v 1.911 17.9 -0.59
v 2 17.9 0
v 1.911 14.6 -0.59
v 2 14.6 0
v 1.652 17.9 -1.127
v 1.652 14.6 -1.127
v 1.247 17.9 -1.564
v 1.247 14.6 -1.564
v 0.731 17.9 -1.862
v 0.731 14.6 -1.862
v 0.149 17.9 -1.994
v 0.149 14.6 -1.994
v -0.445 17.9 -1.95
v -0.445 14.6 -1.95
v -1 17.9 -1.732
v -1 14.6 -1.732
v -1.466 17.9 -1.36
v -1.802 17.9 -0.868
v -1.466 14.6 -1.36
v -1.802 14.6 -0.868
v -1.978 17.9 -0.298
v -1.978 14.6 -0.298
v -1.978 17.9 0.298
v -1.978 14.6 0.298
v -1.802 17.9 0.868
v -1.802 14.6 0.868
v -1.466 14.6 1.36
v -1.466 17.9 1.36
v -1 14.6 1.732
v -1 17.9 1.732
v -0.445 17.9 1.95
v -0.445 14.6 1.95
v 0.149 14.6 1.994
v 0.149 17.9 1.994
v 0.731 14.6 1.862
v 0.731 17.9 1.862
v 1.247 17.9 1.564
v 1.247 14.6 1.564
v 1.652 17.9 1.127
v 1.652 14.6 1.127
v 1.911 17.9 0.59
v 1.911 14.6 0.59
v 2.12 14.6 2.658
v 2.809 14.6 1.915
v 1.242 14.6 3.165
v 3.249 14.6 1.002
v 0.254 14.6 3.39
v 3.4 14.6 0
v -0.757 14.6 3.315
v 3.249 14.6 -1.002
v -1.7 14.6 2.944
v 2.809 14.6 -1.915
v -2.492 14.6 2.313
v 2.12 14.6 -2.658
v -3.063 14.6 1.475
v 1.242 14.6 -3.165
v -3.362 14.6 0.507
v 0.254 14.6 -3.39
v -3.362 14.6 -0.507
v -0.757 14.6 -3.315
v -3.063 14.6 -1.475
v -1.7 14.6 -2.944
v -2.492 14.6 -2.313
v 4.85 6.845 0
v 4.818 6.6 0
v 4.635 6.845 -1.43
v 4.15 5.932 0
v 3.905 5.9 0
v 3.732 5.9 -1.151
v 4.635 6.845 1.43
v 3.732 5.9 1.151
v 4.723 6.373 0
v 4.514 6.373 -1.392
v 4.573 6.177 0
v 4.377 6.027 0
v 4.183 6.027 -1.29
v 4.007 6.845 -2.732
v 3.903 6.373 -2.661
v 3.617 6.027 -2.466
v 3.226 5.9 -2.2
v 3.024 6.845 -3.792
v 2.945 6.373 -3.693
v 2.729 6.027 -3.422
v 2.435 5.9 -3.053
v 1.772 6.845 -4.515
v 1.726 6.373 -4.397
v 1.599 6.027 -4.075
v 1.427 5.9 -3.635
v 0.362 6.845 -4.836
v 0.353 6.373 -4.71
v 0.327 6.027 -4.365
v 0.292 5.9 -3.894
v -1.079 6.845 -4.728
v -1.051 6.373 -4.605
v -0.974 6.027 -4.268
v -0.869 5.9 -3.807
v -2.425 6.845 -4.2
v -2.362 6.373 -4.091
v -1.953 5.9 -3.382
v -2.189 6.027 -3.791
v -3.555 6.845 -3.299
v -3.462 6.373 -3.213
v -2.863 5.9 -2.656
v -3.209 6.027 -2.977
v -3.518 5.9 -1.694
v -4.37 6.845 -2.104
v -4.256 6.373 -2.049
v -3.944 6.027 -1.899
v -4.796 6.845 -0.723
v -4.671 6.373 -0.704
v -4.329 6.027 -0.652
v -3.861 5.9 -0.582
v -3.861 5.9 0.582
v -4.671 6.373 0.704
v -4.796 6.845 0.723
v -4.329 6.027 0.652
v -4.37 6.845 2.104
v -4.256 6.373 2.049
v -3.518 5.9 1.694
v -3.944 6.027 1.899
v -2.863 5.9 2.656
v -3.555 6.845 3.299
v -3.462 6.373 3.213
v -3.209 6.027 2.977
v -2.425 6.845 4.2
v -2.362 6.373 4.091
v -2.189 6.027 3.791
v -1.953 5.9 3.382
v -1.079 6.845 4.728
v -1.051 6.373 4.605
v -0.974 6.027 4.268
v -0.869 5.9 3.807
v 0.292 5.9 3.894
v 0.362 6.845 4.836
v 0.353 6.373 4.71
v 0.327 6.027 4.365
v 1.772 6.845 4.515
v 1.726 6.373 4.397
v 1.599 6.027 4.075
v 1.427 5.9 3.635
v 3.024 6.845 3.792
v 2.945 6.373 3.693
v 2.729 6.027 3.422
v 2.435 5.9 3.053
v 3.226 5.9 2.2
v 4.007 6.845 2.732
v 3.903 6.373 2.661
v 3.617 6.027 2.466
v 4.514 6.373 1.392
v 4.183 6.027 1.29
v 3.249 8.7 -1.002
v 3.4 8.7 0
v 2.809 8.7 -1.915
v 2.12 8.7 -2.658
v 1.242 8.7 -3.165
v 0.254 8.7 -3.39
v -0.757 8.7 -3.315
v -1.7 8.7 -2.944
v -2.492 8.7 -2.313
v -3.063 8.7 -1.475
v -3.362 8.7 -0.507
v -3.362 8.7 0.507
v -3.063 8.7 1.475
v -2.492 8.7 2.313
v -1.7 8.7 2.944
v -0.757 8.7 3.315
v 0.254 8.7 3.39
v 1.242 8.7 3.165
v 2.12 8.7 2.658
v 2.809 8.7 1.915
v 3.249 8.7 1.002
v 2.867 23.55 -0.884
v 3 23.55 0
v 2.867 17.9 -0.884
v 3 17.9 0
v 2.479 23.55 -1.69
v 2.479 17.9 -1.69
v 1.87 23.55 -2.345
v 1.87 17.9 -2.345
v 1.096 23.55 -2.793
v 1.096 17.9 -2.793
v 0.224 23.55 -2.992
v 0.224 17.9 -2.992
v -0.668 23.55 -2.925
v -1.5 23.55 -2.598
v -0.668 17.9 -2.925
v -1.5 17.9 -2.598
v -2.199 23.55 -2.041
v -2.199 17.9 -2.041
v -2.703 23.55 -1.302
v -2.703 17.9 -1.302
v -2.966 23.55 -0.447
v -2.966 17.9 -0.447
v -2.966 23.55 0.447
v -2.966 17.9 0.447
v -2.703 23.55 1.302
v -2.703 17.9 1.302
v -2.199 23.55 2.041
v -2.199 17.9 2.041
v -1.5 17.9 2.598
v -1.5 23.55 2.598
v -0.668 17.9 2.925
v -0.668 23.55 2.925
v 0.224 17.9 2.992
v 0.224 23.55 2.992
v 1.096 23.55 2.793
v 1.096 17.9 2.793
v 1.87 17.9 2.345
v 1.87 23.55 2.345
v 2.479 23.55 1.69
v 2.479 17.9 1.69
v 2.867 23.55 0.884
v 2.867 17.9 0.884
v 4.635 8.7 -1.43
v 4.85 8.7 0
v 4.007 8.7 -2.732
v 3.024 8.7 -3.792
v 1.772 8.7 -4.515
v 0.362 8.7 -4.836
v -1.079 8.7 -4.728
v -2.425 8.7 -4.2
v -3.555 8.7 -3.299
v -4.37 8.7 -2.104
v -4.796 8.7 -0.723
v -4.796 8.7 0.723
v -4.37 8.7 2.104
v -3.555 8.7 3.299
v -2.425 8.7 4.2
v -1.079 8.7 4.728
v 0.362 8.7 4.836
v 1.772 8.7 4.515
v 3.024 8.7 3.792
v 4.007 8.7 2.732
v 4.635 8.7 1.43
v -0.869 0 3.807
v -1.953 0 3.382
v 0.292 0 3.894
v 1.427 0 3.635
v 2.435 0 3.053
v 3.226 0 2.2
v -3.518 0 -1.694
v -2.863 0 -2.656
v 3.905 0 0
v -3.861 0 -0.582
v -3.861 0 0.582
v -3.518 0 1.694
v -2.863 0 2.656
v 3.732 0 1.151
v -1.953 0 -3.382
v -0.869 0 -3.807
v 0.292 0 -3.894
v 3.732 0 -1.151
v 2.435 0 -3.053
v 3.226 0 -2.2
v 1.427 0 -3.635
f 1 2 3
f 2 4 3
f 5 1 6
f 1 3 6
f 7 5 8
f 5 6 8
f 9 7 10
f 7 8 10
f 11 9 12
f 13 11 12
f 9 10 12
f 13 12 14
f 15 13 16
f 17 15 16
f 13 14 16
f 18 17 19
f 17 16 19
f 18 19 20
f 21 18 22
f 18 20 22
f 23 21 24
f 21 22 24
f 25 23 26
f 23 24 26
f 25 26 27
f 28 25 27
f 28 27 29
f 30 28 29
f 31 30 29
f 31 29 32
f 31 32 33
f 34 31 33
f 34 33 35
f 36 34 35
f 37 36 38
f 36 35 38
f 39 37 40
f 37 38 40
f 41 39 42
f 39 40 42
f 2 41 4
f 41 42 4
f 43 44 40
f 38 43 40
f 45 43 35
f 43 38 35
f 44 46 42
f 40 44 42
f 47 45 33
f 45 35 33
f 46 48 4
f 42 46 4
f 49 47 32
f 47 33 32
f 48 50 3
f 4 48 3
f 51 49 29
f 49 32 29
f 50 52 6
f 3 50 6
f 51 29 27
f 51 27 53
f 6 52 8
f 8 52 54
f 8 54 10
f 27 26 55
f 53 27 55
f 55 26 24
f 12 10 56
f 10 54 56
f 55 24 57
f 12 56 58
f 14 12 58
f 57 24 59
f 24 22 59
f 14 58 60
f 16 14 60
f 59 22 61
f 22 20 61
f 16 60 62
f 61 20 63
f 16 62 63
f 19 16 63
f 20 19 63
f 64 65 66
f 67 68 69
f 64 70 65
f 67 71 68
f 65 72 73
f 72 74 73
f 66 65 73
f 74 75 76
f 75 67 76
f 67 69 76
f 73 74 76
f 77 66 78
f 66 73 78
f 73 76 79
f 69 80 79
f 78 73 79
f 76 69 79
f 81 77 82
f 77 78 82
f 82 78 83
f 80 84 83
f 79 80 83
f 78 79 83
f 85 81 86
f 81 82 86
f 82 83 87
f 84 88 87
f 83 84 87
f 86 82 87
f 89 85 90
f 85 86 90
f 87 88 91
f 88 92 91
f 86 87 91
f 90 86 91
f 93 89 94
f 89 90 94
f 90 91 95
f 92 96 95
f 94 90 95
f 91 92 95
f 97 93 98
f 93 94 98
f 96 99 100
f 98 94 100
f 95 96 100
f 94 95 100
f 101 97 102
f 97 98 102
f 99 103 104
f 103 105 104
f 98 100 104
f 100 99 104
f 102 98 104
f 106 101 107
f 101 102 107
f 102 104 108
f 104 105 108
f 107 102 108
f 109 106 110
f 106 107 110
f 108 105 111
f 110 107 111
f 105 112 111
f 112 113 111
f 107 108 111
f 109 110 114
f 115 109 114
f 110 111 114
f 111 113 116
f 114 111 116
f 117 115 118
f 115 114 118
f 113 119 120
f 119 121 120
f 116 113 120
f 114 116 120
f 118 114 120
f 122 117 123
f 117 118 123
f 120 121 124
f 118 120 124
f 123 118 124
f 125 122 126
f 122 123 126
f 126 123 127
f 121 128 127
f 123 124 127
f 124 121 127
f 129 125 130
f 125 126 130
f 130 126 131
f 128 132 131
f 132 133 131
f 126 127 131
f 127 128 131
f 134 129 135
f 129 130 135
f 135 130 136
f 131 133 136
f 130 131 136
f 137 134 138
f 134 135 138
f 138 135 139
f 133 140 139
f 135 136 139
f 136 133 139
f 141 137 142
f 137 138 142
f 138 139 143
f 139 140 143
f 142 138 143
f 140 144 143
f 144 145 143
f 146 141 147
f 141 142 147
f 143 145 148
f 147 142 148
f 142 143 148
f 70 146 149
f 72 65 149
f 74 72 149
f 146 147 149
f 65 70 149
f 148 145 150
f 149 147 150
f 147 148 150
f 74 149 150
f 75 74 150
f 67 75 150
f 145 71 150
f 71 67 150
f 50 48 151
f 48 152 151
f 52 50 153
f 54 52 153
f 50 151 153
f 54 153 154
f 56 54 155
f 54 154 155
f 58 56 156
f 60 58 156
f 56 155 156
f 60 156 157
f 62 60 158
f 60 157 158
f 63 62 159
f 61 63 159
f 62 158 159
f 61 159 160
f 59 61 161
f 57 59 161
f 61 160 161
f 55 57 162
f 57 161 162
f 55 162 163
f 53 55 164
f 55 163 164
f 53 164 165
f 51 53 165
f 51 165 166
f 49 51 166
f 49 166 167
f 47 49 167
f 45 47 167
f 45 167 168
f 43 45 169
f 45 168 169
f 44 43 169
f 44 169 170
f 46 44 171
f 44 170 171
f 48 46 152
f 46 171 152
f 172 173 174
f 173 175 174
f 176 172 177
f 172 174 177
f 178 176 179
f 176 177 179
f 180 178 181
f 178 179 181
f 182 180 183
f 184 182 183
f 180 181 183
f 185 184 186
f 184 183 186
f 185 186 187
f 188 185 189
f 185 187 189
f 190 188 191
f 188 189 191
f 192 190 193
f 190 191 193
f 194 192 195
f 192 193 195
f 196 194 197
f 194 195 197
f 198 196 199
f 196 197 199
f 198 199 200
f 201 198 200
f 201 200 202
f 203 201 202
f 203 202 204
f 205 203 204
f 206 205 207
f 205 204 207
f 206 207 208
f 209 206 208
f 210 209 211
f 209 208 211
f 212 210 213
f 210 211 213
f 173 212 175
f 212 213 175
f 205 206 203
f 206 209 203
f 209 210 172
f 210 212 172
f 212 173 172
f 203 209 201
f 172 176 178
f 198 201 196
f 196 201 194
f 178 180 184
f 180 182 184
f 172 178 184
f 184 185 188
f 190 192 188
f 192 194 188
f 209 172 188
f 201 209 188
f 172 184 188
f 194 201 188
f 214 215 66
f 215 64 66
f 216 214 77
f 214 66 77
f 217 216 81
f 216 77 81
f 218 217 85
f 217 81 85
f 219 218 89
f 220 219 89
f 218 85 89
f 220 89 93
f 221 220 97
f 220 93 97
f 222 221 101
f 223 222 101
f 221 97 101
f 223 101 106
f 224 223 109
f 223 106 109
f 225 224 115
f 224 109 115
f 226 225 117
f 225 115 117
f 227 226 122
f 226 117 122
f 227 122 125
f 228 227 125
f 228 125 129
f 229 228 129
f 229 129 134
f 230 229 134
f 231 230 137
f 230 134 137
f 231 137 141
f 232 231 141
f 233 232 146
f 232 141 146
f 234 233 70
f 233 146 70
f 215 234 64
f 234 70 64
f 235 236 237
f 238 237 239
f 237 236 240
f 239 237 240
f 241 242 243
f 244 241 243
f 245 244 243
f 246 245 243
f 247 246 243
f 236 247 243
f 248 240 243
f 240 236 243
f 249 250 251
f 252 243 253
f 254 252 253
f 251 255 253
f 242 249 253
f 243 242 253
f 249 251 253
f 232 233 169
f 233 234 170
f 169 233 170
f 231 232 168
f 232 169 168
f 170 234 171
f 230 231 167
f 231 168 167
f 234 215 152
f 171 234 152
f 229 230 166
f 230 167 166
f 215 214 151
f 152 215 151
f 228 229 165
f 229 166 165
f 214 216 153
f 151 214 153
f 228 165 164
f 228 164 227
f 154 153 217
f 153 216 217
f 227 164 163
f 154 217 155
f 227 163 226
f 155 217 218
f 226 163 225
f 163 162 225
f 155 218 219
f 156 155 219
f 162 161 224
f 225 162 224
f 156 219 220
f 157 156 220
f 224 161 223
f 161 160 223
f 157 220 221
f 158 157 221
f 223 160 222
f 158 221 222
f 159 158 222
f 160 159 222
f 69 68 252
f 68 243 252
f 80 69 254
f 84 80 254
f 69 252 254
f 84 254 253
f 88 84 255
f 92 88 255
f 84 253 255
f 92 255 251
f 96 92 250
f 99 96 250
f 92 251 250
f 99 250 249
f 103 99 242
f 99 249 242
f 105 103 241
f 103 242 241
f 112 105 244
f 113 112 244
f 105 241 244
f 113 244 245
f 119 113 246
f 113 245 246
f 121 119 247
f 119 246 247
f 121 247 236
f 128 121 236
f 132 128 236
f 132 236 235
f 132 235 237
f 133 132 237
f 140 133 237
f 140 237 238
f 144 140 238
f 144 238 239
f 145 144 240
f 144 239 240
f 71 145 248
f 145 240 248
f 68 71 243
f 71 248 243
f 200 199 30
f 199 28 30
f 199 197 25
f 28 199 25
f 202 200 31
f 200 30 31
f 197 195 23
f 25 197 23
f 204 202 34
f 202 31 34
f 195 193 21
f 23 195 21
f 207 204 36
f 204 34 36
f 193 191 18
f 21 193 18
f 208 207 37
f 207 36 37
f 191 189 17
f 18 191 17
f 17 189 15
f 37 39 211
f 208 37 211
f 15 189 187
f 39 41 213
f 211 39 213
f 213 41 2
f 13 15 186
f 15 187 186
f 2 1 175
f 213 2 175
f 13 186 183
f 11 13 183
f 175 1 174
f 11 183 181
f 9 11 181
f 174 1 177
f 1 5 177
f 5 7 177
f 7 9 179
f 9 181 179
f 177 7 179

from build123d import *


with BuildPart() as part:
    # Sketch1 → Revolve1 (revolve)
    with BuildSketch(Plane.XY):
        with BuildLine():
            Line((0, 23.55), (3, 23.55))
            Line((3, 23.55), (3, 17.9))
            Line((3, 17.9), (2, 17.9))
            Line((2, 17.9), (2, 14.6))
            Line((2, 14.6), (3.4, 14.6))
            Line((3.4, 14.6), (3.4, 8.7))
            Line((3.4, 8.7), (4.85, 8.7))
            Line((4.85, 8.7), (4.85, 6.845))
            ThreePointArc((4.85, 6.845), (4.573215908, 6.176784092), (3.905, 5.9))
            Line((3.905, 5.9), (3.905, 0))
            Line((3.905, 0), (0, 0))
            Line((0, 0), (0, 23.55))
        make_face()
    revolve(axis=Axis((0, 0, 0), (0, 1, 0)))


solid = part.part
